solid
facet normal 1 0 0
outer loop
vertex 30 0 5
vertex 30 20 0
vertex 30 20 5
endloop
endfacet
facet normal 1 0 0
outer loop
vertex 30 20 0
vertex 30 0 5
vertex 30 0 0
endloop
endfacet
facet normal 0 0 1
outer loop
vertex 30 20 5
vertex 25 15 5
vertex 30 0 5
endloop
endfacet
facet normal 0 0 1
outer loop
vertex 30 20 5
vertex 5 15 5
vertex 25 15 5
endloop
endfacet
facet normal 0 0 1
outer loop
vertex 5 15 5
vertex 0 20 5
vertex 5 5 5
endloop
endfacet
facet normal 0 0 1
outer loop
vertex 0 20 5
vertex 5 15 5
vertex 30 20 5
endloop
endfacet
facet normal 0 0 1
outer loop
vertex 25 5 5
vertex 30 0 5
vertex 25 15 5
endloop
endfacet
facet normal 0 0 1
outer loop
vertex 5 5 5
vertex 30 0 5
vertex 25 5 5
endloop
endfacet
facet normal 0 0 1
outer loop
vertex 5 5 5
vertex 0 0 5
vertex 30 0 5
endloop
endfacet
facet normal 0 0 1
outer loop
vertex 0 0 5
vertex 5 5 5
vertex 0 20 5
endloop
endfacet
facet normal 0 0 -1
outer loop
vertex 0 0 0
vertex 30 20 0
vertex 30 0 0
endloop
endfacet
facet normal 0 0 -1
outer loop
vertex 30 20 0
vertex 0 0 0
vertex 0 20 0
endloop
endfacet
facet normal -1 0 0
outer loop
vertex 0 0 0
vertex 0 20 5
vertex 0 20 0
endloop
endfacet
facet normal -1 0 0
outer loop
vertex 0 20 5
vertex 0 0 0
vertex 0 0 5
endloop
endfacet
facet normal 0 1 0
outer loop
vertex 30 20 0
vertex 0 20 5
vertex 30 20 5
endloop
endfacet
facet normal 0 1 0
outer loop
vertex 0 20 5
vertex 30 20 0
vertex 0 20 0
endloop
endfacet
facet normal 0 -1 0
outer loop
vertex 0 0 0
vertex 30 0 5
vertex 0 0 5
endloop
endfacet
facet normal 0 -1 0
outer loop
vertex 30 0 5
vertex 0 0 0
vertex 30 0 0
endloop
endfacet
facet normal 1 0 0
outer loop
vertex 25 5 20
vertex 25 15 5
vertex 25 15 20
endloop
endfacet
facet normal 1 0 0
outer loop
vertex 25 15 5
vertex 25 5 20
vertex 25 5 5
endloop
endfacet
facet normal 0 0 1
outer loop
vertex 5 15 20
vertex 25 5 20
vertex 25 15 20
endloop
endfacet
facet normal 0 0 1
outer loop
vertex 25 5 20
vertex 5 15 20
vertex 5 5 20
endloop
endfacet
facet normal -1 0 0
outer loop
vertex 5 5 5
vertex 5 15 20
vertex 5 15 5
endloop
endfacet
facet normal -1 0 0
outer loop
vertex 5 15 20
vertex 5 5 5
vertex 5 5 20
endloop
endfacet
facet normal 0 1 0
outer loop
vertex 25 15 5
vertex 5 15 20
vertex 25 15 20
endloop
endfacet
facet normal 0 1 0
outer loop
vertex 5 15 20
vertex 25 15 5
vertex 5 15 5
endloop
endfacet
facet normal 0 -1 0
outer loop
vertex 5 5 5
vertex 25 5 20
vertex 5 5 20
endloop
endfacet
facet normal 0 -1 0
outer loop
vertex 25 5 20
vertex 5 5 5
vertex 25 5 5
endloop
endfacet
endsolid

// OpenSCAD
// file: config.scad
// --- Robot Dimensions ---
track_width = 50;        // mm
sprocket_diameter = 50;  // mm
motor_length = 54;       // mm
motor_shaft = 6;         // D-shaft diameter
motor_mount_hole = 3;    // M3
battery_length = 75;     // mm
battery_width  = 55;     // mm
battery_height = 20;     // mm
jetson_plate_length = 120; // mm
jetson_plate_width  = 100; // mm
chassis_thickness = 5;      // mm
// main file
include <config.scad>;

module camera_mount() {
    base_length = 30;
    base_width  = 20;
    base_height = 5;

    cube([base_length, base_width, base_height]);

    // Camera slot
    translate([5,5,base_height])
        cube([20,10,15]);

    // Optional tilt hole
    translate([base_length/2, base_width/2, base_height+7])
        cylinder(h=5, r=2, $fn=32);
}

camera_mount();
